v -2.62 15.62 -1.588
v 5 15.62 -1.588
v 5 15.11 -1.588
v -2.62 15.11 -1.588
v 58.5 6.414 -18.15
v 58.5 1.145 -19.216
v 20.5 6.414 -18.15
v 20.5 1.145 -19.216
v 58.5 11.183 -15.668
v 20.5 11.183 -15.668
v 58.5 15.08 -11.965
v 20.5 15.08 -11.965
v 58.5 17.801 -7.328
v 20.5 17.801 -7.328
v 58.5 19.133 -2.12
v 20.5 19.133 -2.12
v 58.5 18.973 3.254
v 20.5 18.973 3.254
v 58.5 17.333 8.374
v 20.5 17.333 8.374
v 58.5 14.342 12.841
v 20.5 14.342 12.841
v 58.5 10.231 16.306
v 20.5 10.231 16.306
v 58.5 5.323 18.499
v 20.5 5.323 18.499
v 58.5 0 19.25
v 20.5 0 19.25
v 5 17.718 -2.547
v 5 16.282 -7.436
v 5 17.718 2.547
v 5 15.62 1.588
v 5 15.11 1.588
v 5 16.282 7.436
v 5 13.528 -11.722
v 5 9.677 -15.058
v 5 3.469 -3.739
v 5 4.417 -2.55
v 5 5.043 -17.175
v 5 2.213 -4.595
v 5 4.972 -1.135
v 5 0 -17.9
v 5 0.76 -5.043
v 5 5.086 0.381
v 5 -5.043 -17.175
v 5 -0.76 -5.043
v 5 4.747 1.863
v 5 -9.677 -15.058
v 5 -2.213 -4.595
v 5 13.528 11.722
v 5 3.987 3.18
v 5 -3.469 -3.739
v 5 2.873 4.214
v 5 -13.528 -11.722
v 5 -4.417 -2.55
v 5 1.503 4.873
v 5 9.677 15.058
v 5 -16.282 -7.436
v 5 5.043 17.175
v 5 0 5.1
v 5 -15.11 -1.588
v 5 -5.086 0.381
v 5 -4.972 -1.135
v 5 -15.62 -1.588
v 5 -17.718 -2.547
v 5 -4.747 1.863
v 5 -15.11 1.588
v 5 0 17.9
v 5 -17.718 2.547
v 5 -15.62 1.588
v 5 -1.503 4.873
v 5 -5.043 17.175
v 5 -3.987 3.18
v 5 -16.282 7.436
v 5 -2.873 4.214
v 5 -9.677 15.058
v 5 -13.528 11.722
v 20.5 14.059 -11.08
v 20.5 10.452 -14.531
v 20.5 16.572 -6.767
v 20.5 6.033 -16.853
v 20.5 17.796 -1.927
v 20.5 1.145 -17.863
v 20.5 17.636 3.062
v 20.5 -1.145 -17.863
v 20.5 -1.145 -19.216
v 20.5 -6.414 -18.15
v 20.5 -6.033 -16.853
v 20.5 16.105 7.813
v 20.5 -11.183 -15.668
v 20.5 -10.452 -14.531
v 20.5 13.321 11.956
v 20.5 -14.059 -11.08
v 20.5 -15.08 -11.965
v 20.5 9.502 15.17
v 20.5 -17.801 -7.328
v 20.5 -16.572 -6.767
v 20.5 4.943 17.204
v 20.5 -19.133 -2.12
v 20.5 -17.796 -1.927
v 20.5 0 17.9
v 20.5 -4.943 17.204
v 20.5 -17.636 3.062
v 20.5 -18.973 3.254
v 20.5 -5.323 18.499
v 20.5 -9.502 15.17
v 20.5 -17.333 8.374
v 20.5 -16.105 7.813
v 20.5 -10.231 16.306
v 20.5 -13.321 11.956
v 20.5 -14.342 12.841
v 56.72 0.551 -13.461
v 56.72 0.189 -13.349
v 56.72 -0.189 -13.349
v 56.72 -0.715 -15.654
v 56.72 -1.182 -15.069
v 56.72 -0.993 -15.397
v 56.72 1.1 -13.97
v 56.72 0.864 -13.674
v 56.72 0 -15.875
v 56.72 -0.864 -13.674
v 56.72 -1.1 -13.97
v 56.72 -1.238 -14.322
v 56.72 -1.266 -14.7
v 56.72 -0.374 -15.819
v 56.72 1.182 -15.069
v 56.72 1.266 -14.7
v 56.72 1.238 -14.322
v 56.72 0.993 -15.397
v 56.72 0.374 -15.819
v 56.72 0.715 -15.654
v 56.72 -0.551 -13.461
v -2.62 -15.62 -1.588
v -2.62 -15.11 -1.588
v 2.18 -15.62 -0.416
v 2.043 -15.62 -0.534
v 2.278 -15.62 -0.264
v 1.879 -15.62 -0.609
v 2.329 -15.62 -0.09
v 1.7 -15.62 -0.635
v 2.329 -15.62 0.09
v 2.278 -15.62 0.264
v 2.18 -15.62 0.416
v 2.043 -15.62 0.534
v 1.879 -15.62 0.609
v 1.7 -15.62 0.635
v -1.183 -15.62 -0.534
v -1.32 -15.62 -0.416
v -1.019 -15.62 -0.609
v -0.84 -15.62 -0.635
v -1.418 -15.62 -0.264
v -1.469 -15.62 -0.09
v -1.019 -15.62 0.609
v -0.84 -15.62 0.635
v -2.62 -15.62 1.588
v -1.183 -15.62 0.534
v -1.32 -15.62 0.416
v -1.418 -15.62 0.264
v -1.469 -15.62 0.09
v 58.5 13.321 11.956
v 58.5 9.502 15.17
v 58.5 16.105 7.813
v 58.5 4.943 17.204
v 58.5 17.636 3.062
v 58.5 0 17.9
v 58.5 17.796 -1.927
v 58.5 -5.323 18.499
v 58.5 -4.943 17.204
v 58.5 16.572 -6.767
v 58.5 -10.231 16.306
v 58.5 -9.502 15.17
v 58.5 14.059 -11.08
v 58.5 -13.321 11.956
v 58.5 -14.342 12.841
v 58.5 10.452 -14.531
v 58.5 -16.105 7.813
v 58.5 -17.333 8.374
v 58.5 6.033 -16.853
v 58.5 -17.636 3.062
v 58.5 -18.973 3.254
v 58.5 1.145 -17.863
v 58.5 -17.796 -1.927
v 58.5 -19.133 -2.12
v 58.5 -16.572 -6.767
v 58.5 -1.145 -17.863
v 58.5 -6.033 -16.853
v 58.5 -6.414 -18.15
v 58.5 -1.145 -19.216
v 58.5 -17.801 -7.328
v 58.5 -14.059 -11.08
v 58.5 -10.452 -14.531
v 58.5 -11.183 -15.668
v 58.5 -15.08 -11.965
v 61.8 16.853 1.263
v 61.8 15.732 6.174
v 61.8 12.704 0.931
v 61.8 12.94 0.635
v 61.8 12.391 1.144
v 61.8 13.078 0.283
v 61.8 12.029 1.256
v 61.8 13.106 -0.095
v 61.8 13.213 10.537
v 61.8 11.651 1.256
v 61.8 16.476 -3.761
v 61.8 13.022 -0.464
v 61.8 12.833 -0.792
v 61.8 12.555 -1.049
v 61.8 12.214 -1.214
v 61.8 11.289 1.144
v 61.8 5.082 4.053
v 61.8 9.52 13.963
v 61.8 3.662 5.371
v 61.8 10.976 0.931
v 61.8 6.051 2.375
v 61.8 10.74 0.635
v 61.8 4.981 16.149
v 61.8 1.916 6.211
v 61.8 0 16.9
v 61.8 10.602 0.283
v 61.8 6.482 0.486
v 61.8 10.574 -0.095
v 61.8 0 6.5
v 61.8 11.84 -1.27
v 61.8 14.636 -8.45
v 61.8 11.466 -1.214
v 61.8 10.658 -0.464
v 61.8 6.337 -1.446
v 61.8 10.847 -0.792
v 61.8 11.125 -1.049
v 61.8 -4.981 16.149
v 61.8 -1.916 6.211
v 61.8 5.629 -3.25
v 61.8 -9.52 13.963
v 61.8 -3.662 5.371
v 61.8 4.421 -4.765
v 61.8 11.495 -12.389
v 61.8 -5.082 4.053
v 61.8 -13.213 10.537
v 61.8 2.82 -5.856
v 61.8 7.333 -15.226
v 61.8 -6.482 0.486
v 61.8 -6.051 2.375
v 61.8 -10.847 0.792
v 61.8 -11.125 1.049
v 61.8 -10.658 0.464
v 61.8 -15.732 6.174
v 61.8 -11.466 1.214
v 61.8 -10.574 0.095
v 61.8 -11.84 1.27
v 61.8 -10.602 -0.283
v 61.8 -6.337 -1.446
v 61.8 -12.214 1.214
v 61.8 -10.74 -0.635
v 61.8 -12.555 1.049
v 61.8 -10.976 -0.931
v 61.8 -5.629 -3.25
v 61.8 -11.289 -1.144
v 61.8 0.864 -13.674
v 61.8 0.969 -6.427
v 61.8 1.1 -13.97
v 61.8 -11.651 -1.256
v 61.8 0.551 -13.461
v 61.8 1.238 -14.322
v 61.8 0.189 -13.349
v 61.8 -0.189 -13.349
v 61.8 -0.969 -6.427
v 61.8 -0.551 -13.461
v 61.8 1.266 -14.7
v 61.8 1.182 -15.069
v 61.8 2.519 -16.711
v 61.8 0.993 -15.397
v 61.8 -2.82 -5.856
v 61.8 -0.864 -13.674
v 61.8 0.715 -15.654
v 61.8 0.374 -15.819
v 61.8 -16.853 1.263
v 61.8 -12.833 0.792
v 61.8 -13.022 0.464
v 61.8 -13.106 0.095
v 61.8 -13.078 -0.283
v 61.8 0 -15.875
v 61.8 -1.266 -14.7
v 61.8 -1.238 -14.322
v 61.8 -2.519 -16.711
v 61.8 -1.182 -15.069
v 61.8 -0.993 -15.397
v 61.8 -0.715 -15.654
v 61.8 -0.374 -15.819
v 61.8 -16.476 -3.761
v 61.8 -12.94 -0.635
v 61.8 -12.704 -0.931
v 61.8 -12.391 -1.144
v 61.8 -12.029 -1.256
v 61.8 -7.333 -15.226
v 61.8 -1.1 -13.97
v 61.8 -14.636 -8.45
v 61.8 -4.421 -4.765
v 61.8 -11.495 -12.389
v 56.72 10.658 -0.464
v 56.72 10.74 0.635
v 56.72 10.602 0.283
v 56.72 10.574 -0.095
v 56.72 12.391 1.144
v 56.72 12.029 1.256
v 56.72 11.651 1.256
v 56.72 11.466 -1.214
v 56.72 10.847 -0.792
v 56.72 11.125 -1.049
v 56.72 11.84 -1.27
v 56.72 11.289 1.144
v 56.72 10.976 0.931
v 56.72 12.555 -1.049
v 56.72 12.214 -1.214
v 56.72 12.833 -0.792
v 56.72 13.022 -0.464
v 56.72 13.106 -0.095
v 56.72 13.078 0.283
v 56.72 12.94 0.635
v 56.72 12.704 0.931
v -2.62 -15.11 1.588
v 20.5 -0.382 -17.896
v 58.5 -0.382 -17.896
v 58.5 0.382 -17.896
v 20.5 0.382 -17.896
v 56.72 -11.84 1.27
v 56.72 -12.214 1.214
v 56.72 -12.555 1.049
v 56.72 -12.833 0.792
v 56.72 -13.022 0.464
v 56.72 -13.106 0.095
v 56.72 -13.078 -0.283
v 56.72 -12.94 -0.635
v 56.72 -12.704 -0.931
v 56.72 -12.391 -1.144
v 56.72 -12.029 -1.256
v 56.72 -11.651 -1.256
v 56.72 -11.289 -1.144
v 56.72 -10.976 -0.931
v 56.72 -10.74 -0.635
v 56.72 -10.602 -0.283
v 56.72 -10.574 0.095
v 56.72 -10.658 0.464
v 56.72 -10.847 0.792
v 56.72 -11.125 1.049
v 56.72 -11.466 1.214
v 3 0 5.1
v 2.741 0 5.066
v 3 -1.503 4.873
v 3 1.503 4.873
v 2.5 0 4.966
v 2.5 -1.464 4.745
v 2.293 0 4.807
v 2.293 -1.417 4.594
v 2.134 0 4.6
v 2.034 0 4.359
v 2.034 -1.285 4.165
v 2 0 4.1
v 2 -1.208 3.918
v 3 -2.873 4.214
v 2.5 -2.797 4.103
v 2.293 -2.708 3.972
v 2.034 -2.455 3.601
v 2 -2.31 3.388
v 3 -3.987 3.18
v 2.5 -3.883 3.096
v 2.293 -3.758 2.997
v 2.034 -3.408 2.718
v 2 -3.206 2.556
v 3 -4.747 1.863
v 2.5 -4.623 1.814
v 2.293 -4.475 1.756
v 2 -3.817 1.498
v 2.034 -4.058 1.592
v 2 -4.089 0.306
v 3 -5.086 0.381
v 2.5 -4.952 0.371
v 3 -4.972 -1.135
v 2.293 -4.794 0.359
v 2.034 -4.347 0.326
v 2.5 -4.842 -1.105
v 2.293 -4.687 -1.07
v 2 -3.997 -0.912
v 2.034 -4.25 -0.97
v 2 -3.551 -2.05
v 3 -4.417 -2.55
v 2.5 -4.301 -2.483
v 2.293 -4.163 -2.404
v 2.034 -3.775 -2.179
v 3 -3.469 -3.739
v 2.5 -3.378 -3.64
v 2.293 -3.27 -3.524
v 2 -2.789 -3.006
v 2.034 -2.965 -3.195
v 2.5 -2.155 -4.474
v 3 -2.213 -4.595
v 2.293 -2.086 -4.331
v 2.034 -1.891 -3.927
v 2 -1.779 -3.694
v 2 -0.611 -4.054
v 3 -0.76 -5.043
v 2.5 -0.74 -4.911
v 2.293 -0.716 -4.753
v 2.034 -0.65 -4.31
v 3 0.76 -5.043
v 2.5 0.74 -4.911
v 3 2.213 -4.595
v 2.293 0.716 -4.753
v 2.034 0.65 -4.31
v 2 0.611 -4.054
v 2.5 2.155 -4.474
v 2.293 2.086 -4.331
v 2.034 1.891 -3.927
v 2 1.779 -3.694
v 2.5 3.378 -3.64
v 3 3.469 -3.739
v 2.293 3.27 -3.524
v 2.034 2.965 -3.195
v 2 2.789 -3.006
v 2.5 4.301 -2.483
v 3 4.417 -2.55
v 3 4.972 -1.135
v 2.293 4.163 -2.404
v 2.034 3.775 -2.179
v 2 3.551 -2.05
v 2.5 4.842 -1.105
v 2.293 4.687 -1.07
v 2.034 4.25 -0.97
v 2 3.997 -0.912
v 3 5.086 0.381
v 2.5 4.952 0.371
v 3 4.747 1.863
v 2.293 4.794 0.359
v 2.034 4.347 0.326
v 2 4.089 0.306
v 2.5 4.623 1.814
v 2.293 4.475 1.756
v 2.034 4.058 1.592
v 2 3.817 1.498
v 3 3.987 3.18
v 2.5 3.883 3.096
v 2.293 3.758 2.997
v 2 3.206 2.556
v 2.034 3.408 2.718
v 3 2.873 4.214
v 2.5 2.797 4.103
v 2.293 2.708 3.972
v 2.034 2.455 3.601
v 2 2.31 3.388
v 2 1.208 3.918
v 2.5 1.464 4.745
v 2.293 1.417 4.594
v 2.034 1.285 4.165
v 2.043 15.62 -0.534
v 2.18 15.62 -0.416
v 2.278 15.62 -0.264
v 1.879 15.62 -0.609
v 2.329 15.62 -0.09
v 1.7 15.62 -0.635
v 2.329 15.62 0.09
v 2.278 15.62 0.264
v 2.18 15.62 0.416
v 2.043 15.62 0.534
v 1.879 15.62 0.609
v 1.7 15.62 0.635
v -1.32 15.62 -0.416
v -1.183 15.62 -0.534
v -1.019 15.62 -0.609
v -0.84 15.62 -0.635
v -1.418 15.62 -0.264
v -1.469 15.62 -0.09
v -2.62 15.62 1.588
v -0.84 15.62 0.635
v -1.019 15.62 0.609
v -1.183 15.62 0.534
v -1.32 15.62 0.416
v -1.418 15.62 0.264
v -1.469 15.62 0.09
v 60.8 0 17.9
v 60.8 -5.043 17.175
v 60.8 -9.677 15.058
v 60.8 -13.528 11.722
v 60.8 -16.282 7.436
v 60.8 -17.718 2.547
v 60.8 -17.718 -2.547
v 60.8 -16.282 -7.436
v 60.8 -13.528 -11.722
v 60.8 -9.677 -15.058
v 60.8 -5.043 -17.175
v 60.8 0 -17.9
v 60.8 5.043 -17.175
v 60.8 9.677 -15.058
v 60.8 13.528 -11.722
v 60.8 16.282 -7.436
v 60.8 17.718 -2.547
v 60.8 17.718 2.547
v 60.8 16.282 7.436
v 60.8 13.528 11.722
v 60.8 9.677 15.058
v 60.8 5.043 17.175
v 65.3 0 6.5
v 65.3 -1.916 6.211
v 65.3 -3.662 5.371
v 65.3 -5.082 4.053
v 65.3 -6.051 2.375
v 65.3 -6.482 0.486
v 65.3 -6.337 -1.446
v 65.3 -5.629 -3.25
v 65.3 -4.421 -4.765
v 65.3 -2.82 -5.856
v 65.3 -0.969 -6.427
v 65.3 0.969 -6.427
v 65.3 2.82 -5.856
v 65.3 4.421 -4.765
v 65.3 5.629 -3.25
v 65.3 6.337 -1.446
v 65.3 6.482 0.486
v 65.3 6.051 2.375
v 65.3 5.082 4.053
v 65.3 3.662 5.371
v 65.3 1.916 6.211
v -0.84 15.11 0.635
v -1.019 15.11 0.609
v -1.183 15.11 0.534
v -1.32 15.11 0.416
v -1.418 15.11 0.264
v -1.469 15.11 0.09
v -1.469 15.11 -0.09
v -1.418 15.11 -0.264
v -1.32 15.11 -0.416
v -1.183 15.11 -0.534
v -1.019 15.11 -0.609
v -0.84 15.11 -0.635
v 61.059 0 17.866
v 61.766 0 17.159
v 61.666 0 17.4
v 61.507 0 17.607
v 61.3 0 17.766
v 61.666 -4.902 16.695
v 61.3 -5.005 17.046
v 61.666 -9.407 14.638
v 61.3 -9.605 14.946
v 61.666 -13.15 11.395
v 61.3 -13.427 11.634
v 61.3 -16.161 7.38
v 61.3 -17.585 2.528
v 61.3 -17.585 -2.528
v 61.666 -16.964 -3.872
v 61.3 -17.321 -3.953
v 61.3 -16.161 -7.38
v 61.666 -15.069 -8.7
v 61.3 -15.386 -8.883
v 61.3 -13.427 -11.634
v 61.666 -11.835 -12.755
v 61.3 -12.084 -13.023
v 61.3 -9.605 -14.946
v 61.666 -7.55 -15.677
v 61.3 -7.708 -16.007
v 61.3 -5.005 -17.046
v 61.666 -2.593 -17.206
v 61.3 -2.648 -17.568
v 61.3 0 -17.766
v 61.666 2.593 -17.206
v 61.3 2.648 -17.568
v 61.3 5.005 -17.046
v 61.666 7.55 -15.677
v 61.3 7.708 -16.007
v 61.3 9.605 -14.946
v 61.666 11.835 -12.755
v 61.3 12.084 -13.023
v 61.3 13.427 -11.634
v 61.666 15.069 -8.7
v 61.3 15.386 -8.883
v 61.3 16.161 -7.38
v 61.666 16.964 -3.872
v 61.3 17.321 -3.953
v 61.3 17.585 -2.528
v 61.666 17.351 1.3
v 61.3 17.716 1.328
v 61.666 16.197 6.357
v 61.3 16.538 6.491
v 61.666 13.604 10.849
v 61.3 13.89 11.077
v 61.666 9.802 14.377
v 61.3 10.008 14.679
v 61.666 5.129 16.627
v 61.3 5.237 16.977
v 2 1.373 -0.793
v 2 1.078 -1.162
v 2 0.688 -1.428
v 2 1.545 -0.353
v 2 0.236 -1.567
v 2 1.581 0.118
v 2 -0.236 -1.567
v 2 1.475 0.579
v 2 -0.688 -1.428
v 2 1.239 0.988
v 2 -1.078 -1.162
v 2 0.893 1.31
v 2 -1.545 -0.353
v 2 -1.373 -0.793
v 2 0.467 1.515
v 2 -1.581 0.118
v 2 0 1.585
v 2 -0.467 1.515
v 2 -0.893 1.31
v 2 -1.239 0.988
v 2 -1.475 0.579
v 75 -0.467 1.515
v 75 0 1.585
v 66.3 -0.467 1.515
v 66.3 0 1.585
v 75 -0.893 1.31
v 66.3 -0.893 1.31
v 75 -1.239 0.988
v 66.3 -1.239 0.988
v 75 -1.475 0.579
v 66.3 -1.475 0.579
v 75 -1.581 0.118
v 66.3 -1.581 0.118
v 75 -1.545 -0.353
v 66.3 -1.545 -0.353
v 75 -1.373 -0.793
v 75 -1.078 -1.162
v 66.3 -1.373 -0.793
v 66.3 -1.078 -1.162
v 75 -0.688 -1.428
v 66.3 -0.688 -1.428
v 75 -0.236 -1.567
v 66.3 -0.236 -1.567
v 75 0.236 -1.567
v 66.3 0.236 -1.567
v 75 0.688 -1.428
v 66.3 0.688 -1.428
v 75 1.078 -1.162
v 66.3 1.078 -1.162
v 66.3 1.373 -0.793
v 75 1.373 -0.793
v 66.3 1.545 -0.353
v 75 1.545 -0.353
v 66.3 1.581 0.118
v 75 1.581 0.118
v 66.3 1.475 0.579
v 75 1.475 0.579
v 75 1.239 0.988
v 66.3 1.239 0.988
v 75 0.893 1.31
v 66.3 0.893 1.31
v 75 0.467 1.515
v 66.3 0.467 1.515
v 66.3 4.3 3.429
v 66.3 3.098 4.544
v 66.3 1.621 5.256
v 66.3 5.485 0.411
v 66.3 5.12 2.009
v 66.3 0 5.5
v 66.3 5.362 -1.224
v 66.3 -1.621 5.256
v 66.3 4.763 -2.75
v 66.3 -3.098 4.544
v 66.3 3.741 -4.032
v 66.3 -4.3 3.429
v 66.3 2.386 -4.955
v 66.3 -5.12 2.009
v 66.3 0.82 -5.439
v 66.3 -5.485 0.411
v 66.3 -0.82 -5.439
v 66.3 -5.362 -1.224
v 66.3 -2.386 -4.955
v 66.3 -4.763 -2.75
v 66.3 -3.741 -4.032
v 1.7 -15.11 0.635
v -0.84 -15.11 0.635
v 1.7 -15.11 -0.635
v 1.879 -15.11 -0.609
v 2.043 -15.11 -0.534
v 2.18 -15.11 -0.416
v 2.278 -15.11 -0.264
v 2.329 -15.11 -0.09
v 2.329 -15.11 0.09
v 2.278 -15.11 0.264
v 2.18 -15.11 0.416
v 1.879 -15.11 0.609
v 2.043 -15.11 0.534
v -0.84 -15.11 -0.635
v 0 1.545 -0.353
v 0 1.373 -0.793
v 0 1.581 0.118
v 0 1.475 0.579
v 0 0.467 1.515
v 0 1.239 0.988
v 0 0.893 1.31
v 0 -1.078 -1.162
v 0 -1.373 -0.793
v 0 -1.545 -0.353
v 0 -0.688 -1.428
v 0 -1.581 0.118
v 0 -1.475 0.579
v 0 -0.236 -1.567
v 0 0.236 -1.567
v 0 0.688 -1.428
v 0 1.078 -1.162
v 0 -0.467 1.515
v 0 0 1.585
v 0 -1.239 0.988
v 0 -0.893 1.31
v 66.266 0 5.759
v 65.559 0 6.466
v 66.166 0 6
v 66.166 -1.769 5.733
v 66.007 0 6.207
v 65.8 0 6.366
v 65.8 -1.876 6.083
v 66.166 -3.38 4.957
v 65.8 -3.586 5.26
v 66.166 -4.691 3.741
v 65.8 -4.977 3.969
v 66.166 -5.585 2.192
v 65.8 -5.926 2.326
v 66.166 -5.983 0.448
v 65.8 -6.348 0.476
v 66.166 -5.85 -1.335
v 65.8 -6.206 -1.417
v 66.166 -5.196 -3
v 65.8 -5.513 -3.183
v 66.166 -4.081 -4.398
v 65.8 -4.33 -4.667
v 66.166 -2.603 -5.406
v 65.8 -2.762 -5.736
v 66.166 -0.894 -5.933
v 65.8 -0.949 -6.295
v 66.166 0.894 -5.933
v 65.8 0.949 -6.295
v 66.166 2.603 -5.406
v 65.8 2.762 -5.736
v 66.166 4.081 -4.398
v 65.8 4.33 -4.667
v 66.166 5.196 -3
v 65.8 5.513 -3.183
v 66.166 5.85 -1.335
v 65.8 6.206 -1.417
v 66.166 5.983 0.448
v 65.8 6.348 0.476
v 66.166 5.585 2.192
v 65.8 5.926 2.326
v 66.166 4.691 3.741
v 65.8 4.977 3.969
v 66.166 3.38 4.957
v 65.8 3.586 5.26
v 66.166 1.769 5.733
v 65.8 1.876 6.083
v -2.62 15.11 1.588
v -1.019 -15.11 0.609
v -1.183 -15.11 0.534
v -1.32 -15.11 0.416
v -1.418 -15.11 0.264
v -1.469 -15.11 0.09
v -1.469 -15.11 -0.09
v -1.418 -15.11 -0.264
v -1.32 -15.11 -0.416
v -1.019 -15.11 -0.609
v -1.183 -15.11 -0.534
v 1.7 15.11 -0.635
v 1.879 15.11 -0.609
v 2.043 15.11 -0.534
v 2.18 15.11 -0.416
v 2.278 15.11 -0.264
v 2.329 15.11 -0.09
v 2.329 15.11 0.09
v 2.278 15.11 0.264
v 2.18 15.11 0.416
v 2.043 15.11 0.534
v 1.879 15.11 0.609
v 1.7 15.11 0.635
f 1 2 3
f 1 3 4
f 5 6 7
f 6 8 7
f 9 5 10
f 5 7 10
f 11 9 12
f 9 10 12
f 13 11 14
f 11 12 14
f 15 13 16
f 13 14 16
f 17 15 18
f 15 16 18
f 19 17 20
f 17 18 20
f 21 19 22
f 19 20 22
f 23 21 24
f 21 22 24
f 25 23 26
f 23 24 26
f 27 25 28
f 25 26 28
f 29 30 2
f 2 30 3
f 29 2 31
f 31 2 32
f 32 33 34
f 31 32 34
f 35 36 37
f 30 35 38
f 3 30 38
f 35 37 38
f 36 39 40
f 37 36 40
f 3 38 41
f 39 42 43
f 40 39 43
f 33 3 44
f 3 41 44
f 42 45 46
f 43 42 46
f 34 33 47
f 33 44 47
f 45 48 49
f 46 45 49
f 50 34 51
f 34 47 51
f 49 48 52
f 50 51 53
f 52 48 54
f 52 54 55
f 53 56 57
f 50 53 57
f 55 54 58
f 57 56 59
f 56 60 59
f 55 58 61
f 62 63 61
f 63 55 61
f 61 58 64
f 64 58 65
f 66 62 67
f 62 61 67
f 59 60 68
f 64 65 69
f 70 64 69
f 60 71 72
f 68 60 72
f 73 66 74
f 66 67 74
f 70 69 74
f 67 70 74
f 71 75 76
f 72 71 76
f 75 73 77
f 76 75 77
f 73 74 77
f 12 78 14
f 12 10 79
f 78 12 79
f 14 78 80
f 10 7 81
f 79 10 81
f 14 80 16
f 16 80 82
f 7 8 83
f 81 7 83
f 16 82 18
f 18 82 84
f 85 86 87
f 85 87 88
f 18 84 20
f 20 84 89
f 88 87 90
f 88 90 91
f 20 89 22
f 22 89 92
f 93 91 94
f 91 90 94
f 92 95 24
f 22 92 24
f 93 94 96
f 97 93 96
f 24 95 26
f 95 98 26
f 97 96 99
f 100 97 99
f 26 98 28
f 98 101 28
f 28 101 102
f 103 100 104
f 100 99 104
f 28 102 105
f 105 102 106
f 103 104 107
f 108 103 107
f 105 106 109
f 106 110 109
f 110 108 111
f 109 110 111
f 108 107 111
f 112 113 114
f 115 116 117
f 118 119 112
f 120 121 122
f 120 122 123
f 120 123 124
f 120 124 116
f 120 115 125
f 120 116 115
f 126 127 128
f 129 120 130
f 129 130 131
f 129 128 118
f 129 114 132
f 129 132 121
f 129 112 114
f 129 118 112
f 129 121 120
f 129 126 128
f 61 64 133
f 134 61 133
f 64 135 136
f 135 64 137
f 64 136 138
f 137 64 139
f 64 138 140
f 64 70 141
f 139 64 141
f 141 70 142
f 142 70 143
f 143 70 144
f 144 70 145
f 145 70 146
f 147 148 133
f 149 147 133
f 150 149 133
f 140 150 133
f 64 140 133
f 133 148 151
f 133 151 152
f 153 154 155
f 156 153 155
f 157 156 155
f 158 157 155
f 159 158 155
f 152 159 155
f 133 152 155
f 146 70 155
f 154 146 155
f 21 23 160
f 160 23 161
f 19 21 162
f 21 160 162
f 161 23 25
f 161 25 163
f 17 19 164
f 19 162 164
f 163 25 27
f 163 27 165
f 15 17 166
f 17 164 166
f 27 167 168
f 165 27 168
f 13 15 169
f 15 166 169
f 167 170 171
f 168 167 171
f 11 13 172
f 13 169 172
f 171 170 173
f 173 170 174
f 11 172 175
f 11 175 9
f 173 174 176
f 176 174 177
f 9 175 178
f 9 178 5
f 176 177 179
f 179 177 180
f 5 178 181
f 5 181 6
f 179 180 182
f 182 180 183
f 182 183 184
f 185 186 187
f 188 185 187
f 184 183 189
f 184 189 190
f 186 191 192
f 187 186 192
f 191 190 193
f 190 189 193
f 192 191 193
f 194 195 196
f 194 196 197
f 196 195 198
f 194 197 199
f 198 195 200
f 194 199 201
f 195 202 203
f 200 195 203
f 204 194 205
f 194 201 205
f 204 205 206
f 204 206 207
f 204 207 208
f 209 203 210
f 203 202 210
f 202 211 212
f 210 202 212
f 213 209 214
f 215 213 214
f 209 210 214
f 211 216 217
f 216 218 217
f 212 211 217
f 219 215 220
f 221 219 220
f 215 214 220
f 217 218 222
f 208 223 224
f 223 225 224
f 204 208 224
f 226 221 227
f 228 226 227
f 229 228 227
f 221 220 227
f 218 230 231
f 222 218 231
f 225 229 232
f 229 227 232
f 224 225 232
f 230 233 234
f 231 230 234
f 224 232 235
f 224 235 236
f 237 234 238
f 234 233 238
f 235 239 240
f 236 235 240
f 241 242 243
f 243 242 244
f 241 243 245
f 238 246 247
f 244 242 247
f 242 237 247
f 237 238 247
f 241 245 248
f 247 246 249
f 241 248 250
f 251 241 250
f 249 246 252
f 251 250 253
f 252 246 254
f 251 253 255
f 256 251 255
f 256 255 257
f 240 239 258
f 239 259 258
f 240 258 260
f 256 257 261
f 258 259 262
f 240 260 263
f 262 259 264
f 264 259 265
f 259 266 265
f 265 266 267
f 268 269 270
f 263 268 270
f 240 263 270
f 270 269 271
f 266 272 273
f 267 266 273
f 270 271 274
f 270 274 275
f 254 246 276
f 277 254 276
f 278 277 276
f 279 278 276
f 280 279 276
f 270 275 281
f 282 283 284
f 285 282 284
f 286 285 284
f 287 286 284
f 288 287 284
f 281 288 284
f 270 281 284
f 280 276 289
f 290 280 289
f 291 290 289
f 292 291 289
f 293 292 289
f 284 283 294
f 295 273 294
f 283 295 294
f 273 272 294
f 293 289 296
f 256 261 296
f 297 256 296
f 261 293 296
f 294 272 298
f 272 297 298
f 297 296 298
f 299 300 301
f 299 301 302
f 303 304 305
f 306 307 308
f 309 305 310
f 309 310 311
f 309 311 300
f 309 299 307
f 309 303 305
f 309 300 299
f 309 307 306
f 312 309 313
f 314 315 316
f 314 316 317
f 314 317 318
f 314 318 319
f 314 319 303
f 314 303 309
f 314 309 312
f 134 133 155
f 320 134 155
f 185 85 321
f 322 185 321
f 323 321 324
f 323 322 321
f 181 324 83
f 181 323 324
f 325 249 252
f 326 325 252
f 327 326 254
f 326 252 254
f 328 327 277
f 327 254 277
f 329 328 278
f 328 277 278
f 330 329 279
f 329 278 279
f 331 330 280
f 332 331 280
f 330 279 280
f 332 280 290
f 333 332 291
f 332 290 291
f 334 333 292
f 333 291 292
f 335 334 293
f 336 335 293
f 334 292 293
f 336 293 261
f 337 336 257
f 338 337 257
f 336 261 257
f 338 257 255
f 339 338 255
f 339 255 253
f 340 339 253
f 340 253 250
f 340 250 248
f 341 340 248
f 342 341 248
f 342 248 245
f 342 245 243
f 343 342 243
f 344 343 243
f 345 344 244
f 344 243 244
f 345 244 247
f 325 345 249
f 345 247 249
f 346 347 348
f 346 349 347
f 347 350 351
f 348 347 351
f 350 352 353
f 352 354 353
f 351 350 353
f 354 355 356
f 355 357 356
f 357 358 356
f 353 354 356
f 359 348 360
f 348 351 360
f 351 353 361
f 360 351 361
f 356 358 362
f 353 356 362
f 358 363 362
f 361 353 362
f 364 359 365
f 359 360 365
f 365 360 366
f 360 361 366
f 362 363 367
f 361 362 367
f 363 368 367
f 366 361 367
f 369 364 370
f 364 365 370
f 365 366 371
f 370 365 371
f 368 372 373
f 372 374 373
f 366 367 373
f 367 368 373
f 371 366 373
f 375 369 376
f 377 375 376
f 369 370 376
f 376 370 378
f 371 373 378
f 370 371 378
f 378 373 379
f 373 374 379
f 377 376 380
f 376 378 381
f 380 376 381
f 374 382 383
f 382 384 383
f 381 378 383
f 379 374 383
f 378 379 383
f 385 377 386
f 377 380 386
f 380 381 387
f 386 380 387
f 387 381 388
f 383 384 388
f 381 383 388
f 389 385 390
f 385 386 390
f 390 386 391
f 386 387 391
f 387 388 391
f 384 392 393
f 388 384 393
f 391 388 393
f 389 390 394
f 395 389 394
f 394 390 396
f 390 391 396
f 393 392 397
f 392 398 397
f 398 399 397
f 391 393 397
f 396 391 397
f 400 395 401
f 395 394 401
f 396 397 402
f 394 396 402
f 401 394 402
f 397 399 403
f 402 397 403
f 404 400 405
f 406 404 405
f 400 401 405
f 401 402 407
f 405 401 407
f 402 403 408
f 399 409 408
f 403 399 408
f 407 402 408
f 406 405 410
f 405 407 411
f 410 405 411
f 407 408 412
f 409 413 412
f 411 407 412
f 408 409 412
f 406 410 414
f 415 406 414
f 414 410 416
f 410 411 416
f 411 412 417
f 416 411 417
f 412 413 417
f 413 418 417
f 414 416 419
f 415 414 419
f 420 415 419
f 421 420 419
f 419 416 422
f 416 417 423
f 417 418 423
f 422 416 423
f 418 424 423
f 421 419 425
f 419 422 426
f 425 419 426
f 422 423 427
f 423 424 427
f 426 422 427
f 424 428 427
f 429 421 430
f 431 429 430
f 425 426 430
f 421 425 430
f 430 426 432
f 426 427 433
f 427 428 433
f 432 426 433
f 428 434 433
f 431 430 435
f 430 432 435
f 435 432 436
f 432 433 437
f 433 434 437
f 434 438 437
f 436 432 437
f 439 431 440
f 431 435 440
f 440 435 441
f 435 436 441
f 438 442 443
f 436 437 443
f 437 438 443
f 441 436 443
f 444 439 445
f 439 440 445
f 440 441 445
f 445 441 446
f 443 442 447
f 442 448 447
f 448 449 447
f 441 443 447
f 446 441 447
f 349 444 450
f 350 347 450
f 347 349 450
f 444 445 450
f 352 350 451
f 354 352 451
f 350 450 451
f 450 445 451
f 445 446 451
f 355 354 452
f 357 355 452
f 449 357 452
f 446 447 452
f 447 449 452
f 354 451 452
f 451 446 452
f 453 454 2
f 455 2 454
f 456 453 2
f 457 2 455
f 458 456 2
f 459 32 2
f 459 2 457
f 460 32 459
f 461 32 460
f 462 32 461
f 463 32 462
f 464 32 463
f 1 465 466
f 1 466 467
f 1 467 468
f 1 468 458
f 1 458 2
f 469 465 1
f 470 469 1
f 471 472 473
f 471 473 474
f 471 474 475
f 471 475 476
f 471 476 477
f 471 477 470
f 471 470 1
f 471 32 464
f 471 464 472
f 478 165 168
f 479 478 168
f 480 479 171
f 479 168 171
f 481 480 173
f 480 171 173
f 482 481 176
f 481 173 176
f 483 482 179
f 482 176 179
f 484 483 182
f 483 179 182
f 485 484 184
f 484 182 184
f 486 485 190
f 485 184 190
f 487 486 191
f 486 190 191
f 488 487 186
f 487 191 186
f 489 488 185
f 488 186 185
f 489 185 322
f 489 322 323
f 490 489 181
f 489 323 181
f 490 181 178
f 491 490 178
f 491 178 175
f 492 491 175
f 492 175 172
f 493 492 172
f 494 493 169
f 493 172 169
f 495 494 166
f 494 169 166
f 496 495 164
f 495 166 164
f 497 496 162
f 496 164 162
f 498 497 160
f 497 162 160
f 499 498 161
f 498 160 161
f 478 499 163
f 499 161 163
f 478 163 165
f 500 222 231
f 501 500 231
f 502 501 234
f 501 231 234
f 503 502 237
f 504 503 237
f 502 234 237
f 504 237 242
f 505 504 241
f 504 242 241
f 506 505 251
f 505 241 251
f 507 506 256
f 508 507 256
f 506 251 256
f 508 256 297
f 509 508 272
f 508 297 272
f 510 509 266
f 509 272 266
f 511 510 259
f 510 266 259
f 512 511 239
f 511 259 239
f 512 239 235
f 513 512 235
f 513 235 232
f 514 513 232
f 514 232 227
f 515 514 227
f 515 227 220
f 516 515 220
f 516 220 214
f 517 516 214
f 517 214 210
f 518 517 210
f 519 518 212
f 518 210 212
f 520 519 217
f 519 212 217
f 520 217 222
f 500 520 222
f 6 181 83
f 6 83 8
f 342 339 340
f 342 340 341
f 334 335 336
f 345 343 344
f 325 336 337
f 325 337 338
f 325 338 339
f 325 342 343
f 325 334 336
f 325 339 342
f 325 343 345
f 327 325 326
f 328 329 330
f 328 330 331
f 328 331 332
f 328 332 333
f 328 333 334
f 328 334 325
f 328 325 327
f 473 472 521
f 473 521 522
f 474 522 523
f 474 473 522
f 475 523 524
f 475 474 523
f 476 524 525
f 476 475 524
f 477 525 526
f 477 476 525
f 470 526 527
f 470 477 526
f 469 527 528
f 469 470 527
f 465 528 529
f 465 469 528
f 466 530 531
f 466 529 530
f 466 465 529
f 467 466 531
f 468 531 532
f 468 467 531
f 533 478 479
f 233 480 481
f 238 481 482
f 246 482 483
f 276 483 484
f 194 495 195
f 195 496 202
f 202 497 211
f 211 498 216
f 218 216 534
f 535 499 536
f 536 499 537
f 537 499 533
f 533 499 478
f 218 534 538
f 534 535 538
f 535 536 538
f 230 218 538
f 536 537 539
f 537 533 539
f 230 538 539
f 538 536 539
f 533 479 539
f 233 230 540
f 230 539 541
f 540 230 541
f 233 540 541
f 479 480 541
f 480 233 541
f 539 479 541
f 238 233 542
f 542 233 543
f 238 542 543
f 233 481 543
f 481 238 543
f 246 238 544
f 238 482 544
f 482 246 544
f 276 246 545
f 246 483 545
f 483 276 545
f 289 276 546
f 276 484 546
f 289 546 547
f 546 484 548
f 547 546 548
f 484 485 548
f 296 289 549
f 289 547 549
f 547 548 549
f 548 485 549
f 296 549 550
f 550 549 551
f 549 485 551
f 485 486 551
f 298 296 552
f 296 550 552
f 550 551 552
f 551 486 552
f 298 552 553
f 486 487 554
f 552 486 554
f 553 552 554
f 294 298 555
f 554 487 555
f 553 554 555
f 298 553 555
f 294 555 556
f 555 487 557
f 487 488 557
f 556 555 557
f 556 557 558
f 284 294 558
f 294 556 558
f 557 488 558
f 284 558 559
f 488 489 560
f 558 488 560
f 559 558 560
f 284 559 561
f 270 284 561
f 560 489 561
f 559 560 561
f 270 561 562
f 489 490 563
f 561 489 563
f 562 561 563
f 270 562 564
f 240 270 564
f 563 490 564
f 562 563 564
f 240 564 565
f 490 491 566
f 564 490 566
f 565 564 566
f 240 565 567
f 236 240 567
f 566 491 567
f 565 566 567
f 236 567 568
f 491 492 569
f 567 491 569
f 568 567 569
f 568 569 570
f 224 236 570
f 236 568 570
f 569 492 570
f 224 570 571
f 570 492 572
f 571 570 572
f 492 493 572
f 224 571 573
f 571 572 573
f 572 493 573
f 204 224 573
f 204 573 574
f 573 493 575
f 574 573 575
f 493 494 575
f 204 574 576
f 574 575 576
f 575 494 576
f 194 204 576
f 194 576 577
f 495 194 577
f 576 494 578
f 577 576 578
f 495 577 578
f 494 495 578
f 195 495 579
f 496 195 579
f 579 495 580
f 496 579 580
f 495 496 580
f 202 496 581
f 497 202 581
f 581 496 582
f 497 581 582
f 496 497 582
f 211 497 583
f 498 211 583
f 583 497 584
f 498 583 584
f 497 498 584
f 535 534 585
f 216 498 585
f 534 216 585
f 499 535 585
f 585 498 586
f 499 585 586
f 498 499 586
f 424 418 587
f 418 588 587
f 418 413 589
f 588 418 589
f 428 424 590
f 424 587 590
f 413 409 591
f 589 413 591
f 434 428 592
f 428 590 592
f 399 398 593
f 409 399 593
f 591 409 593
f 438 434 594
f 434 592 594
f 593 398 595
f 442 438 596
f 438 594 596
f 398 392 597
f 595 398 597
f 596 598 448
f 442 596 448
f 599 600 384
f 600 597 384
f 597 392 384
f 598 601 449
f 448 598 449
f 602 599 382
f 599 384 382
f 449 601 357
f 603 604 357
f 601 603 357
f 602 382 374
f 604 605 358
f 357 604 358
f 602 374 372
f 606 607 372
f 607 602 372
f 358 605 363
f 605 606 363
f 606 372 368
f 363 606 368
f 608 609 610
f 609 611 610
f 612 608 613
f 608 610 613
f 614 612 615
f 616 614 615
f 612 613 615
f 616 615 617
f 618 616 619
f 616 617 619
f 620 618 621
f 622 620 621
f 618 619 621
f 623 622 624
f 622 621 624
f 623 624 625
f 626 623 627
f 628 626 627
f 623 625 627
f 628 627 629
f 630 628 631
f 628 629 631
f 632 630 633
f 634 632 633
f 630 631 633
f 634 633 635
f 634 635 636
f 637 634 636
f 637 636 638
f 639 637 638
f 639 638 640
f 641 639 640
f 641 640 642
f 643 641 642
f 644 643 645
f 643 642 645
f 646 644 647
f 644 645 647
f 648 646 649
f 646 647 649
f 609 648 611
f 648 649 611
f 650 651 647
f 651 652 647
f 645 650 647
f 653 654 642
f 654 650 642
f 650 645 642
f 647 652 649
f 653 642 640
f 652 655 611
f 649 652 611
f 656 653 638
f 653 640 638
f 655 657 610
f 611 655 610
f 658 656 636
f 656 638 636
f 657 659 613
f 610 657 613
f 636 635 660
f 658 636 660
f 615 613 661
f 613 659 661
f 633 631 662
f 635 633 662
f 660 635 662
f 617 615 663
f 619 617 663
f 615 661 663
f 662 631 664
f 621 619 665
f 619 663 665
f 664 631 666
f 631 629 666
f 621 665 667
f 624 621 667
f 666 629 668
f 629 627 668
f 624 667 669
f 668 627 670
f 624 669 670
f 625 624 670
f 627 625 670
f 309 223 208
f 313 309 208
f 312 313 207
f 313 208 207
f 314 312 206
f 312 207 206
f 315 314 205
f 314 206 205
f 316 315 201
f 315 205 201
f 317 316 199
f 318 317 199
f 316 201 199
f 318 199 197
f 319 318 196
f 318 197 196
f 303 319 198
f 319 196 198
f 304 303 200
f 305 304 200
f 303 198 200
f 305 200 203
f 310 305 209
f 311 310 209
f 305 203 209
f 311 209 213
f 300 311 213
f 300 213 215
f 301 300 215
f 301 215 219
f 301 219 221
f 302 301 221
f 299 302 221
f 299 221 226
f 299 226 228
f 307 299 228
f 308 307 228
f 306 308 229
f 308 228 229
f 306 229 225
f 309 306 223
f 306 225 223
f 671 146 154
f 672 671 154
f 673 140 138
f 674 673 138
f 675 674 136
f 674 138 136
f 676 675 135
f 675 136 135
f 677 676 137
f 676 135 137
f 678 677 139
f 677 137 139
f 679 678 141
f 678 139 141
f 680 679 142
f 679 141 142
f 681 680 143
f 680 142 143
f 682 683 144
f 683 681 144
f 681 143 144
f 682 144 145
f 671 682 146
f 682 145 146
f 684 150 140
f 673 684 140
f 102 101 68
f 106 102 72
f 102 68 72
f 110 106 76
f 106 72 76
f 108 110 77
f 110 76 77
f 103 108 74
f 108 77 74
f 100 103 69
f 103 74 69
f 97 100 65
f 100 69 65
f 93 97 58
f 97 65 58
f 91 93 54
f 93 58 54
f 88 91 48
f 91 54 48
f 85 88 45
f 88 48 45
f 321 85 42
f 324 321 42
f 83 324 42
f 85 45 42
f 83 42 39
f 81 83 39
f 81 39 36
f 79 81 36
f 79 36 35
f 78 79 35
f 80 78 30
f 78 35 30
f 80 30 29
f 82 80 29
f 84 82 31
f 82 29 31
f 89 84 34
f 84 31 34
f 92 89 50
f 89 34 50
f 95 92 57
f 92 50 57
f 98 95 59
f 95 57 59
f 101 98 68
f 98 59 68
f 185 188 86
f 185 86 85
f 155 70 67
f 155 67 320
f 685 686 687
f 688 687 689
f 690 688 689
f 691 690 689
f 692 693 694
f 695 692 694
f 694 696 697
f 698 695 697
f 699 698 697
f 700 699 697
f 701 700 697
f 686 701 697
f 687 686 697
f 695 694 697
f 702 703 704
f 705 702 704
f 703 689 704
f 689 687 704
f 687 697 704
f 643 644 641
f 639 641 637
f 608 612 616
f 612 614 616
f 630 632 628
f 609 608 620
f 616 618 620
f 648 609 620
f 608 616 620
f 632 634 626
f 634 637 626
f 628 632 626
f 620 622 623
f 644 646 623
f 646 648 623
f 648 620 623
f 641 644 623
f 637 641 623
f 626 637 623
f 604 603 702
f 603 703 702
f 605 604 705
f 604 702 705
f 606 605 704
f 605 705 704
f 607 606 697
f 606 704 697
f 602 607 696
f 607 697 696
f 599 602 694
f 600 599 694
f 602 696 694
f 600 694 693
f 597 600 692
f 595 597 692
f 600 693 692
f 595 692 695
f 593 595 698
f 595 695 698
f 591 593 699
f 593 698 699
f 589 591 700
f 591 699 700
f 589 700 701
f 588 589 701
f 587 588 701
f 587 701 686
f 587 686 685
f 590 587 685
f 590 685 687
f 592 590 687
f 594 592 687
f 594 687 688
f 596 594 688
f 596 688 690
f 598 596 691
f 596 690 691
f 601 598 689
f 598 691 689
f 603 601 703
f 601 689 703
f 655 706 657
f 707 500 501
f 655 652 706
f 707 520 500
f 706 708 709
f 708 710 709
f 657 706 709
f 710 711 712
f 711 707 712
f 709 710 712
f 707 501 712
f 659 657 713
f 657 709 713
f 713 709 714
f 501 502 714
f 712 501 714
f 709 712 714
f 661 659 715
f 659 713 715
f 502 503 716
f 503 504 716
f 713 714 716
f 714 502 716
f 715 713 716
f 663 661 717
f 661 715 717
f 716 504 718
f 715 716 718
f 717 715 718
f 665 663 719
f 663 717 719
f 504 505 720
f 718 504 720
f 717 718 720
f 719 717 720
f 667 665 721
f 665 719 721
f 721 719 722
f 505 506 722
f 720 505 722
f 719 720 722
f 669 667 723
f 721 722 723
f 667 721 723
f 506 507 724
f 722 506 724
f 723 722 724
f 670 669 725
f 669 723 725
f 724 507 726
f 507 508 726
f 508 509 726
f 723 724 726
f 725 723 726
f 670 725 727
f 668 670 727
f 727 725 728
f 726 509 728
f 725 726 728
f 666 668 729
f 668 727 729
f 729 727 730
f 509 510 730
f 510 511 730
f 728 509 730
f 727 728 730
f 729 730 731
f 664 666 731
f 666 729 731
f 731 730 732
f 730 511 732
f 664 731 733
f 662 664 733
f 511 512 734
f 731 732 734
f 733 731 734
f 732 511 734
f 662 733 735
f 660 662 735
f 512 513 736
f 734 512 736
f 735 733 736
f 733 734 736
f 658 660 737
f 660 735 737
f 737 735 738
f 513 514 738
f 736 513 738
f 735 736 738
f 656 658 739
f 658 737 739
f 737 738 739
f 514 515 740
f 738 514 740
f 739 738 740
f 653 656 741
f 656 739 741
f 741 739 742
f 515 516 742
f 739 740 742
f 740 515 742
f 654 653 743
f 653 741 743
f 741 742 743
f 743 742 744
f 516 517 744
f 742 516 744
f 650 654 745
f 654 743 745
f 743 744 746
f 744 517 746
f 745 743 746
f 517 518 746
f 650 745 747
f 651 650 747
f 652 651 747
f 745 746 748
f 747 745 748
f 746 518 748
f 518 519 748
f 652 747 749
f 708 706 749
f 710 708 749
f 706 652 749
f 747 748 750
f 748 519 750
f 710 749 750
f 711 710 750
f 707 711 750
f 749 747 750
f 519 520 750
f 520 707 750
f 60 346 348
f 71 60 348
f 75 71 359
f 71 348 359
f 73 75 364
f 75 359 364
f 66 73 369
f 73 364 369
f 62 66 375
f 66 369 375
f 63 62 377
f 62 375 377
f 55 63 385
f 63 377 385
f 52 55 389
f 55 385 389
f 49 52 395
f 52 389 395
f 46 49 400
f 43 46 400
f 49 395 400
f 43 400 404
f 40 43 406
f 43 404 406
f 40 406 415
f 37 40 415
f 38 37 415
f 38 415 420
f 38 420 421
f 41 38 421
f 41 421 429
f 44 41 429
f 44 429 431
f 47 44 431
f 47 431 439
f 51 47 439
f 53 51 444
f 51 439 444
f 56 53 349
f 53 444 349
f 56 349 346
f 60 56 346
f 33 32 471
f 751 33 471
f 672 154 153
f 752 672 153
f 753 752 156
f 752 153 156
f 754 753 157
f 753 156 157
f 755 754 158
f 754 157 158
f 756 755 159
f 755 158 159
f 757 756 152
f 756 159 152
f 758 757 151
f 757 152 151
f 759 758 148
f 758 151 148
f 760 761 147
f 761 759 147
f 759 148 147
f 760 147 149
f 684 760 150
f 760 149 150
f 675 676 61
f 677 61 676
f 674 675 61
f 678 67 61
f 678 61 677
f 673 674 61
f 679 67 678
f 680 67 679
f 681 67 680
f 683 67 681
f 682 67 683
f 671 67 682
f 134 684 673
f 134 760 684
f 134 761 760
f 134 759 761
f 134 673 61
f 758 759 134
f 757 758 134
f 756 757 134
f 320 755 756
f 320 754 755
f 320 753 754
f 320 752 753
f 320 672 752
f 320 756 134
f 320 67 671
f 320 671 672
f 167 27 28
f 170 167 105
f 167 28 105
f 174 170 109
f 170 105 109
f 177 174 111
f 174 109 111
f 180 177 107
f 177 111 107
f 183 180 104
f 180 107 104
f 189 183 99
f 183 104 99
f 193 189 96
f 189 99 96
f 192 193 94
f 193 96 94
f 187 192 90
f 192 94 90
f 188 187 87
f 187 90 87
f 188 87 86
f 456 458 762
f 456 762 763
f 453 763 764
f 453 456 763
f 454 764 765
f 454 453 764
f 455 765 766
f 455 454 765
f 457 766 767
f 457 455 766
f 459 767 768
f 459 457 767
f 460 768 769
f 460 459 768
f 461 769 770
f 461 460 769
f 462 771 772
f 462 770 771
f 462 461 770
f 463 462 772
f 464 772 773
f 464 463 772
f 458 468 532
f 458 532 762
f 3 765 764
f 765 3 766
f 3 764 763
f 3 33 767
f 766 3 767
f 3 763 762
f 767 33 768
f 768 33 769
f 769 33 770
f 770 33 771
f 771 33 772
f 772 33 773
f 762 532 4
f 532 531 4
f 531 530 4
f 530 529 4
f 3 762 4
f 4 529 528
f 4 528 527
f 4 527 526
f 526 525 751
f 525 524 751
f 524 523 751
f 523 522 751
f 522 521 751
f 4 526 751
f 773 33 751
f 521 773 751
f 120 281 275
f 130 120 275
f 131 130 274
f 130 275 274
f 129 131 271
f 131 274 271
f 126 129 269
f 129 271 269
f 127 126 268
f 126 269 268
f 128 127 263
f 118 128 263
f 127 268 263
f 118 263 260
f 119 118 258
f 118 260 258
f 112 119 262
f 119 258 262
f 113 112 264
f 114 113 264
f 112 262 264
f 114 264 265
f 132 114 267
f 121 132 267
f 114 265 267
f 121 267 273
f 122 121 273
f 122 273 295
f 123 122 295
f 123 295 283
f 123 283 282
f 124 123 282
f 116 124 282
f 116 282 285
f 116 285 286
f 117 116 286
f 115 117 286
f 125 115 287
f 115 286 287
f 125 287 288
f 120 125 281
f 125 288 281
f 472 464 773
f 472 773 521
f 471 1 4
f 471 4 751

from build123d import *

# Parameters (mm, degrees)
SKETCH2_R         = 1.27
EXTRUDE1_DEPTH    = 5.08
CIRPATTERN1_COUNT = 2
SKETCH6_R         = 1.27
EXTRUDE5_DEPTH    = 5.08
EXTRUDE2_REACH    = 66.524
SKETCH4_W         = 7.62
SKETCH4_H         = 3.175
EXTRUDE3_DEPTH    = 0.51
EXTRUDE4_REACH    = 86.92
FILETE1_R         = 1


with BuildPart() as part:
    # Sketch1 → Revolve1 (revolve)
    with BuildSketch(Plane.XY, mode=Mode.PRIVATE) as revolve1_sk:
        Polygon((0, 0), (75, 0), (75, 1.585), (66.3, 1.585), (66.3, 6.5), (61.8, 6.5), (61.8, 17.900000014), (58.5, 17.900000014), (58.5, 19.249999981), (20.5, 19.249999981), (20.5, 17.900000014), (5, 17.900000014), (5, 5.1), (2, 5.1), (2, 1.585), (0, 1.585), align=None)
    revolve(revolve1_sk.sketch.rotate(Axis((0, 0, 0), (1, 0, 0)), 90), axis=Axis((0, 0, 0), (1, 0, 0)))

    # Sketch2 → Extrude1 (cut)
    with BuildSketch(Plane(origin=(61.8, 0, 0), x_dir=(0, 0, -1), z_dir=(1, 0, 0))):
        with Locations((0, 11.84)):
            Circle(SKETCH2_R)
    extrude1 = extrude(amount=-EXTRUDE1_DEPTH, mode=Mode.SUBTRACT)

    # CirPattern1: Extrude1 ×2 about axis
    cirpattern1_axis = Axis((0, 0, 0), (1, 0, 0))
    for i in range(1, CIRPATTERN1_COUNT):
        add(extrude1.rotate(cirpattern1_axis, i * 360 / CIRPATTERN1_COUNT), mode=Mode.SUBTRACT)

    # Sketch6 → Extrude5 (cut)
    with BuildSketch(Plane(origin=(61.8, 0, 0), x_dir=(0, 0, -1), z_dir=(1, 0, 0))):
        with Locations((14.605, 0)):
            Circle(SKETCH6_R)
    extrude(amount=-EXTRUDE5_DEPTH, mode=Mode.SUBTRACT)

    # Sketch3 → Extrude2 (cut, up to next)
    with BuildSketch(Plane(origin=(58.5, 0, 0), x_dir=(0, 0, -1), z_dir=(1, 0, 0)), mode=Mode.PRIVATE) as extrude2_sk1:
        with BuildLine():
            Line((17.863341667, 1.145), (19.863341667, 1.145))
            Line((19.863341667, 1.145), (19.863341667, -1.145))
            Line((19.863341667, -1.145), (17.863341667, -1.145))
            ThreePointArc((17.863341667, -1.145), (17.900000014, 0), (17.863341667, 1.145))
        make_face()
    extrude2_tool1 = extrude(extrude2_sk1.sketch, amount=-EXTRUDE2_REACH, mode=Mode.PRIVATE) & part.part
    add(extrude2_tool1.solids().sort_by_distance((58.5, 0, -18.875533))[0], mode=Mode.SUBTRACT)

    # Sketch4 → Extrude3 (add)
    with BuildSketch(Plane(origin=(0, 15.62, 0), x_dir=(-1, 0, 0), z_dir=(0, 1, 0))):
        with Locations((-1.19, 0)):
            Rectangle(SKETCH4_W, SKETCH4_H)
    extrude3 = extrude(amount=-EXTRUDE3_DEPTH)

    # Sketch5 → Extrude4 (cut, up to next)
    with BuildSketch(Plane(origin=(0, 15.62, 0), x_dir=(1, 0, 0), z_dir=(0, 1, 0)), mode=Mode.PRIVATE) as extrude4_sk1:
        with BuildLine():
            Line((-0.84, 0.635), (1.7, 0.635))
            ThreePointArc((1.7, 0.635), (2.335, 0), (1.7, -0.635))
            Line((1.7, -0.635), (-0.84, -0.635))
            ThreePointArc((-0.84, -0.635), (-1.475, 0), (-0.84, 0.635))
        make_face()
    extrude4_tool1 = extrude(extrude4_sk1.sketch, amount=-EXTRUDE4_REACH, mode=Mode.PRIVATE) & part.part
    extrude4 = extrude4_tool1.solids().sort_by_distance((0.43, 15.62, 0))[0]
    add(extrude4, mode=Mode.SUBTRACT)

    # Mirror1: Extrude3, Extrude4 across plane
    add(extrude3.mirror(Plane.ZX))
    add(extrude4.mirror(Plane.ZX), mode=Mode.SUBTRACT)

    # Filete1
    filete1_edges = [part.edges().sort_by_distance(p)[0] for p in [
        (2, 0, -5.1),
        (61.8, 0, -17.900000014),
        (66.3, 0, -6.5),
    ]]
    fillet(filete1_edges, radius=FILETE1_R)


solid = part.part
